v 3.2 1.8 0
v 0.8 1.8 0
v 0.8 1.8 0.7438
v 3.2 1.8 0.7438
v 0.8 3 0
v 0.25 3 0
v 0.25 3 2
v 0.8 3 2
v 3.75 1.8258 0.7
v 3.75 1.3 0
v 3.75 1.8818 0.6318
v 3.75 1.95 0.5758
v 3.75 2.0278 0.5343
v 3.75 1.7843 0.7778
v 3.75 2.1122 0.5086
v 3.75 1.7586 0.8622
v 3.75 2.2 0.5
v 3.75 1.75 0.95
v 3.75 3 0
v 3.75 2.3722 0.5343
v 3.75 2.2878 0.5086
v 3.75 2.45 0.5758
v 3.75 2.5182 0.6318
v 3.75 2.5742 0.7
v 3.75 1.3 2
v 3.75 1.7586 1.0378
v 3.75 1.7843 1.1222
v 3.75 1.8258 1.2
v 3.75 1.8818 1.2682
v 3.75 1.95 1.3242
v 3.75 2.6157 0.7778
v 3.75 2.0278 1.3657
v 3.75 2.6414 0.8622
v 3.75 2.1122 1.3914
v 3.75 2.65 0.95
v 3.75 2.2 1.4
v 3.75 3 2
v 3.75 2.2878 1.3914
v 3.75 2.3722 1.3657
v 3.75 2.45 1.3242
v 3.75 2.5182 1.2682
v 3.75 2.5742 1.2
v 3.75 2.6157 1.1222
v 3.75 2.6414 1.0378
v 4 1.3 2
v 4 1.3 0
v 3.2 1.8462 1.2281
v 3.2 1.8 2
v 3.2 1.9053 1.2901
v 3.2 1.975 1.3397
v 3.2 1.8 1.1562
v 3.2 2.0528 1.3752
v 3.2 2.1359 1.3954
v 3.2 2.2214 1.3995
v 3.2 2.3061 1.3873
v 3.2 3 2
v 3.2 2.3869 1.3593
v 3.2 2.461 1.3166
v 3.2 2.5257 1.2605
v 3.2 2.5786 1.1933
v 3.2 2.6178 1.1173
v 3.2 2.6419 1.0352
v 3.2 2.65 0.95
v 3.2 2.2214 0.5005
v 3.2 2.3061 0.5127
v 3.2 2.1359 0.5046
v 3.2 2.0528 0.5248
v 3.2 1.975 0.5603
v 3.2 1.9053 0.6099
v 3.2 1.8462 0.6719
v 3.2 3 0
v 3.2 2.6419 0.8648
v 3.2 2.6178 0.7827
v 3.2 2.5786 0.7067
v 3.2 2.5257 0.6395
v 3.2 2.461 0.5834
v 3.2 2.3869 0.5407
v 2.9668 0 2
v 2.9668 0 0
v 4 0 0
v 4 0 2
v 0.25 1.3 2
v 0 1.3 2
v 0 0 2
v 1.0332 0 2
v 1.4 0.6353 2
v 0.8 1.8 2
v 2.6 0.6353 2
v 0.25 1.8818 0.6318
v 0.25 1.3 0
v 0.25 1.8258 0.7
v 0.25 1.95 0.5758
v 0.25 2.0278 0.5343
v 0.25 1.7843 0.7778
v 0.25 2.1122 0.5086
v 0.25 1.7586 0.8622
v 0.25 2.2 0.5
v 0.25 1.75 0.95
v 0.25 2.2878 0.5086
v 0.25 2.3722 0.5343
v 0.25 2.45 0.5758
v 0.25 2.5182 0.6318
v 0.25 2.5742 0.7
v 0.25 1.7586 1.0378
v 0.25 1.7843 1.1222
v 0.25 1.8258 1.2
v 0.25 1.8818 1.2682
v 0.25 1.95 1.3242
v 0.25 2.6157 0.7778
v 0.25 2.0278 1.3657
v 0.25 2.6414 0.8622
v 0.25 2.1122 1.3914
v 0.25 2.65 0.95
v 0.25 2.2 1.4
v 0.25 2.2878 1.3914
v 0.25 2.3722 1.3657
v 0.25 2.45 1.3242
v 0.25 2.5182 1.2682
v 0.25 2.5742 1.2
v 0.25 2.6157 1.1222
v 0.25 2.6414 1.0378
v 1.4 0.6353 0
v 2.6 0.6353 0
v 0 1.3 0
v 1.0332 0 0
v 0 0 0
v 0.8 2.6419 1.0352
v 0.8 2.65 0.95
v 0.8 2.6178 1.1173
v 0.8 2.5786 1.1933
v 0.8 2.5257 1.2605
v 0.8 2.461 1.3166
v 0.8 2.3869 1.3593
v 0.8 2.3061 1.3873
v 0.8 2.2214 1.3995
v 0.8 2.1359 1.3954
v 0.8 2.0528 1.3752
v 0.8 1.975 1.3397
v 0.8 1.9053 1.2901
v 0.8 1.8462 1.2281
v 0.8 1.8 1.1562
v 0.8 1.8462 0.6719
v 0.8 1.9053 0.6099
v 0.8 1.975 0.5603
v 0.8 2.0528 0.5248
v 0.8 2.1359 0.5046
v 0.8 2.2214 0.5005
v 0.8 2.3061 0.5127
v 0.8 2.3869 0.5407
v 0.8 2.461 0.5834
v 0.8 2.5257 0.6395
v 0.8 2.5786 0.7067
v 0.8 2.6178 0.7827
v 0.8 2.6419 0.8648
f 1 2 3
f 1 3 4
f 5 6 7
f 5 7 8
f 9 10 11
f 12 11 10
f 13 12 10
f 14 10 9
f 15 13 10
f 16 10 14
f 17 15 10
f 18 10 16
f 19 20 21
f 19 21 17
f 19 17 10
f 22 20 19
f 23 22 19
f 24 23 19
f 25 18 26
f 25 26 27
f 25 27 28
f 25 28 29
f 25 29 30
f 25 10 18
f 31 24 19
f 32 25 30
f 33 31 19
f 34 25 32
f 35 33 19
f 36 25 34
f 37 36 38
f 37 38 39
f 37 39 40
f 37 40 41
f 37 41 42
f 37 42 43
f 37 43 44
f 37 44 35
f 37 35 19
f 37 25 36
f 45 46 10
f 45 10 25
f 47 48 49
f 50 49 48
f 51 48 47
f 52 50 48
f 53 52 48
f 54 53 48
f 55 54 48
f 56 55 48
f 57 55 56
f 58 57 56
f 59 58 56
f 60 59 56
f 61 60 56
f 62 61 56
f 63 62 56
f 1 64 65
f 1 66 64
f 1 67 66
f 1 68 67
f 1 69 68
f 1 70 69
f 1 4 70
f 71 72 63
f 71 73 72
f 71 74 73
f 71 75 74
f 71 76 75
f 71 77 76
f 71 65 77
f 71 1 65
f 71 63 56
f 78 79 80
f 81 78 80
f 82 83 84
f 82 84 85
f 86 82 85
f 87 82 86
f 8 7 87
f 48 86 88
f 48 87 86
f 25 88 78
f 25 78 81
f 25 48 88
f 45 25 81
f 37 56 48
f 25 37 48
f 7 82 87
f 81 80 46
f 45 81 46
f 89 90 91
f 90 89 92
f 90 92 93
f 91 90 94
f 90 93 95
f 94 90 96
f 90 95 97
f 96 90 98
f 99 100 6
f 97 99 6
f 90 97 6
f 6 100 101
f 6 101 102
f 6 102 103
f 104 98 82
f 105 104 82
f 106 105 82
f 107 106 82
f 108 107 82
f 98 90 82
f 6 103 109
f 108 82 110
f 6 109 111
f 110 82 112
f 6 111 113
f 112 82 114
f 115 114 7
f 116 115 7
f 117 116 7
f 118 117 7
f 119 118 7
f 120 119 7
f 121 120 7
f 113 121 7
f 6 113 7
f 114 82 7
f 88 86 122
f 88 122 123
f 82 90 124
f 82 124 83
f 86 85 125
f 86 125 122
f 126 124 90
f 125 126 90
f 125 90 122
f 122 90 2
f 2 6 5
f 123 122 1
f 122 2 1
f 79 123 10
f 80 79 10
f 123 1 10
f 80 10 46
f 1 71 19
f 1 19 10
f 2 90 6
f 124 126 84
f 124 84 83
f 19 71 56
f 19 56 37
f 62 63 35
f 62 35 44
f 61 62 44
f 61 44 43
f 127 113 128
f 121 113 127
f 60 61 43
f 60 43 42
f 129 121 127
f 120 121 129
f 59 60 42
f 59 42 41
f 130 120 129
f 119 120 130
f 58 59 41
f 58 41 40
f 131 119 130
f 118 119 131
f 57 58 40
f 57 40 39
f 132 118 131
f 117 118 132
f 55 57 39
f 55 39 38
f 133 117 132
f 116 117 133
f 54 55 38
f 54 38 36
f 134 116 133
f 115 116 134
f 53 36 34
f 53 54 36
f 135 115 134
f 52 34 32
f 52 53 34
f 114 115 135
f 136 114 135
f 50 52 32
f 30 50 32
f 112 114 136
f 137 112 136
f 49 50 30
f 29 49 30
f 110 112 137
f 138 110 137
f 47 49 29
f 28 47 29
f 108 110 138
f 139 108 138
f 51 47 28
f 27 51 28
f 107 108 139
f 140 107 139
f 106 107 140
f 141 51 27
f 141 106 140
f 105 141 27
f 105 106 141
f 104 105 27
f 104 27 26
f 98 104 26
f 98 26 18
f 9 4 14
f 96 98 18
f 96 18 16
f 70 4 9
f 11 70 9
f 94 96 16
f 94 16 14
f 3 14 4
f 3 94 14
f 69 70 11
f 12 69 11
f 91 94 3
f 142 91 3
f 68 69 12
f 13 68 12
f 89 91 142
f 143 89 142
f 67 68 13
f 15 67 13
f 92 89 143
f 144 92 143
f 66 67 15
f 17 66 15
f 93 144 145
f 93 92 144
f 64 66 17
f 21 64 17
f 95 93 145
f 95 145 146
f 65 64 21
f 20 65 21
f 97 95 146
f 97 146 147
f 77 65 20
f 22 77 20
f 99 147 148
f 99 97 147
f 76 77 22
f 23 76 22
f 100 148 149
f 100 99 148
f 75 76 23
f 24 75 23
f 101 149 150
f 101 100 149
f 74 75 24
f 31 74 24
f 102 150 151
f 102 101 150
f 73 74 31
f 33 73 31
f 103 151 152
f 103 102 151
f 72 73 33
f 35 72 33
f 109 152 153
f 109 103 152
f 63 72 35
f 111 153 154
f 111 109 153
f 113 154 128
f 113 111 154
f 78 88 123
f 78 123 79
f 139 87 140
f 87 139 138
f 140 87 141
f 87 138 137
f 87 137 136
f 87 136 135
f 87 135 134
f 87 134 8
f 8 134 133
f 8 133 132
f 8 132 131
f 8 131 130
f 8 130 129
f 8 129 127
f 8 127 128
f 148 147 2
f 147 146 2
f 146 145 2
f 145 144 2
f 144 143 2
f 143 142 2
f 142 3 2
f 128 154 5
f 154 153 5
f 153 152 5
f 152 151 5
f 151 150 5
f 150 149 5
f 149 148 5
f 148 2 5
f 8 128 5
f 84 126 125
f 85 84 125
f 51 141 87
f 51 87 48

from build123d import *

# Parameters (mm, degrees)
BOX_W                = 4
BOX_H                = 3
BOX_DEPTH            = 2
SKETCH_W             = 1.7
SKETCH_H             = 2
POCKET_DEPTH         = 0.25
SKETCH001_W          = 1.7
SKETCH001_H          = 2
POCKET001_DEPTH      = 0.25
PRISM_DEPTH          = 2
SKETCH003_R          = 0.45
POCKET002_DEPTH      = 5
BOX001_W             = 2.4
BOX001_H             = 1.2
BOX001_DEPTH         = 2
SKETCH004_R          = 0.45
POCKET003_DEPTH      = 0.001
POCKET003_DEPTH_BACK = -4.001


with BuildPart() as part:
    # Box → Box (join)
    with BuildSketch(Plane.XY):
        with Locations((2, 1.5)):
            Rectangle(BOX_W, BOX_H)
    extrude(amount=BOX_DEPTH)

    # Sketch → Pocket (cut, symmetric)
    with BuildSketch(Plane.YZ):
        with Locations((2.15, 1)):
            Rectangle(SKETCH_W, SKETCH_H)
    extrude(amount=POCKET_DEPTH, both=True, mode=Mode.SUBTRACT)

    # Sketch001 (on Face8 of Pocket) → Pocket001 (cut, symmetric)
    with BuildSketch(Plane.YZ.offset(4)):
        with Locations((2.15, 1)):
            Rectangle(SKETCH001_W, SKETCH001_H)
    extrude(amount=POCKET001_DEPTH, both=True, mode=Mode.SUBTRACT)

    # Prism → Prism (cut)
    with BuildSketch(Plane(origin=(2, -0.40392, 2), x_dir=(1, 0, 0), z_dir=(0, 0, -1))):
        Polygon((1.2, 0), (0.6, 1.03923), (-0.6, 1.03923), (-1.2, 0), (-0.6, -1.03923), (0.6, -1.03923), align=None)
    extrude(amount=PRISM_DEPTH, mode=Mode.SUBTRACT)

    # Sketch003 (on Face8 of Prism) → Pocket002 (cut)
    with BuildSketch(Plane(origin=(3.75, -0.40392, 2), x_dir=(0, -1, 0), z_dir=(1, 0, 0))):
        with Locations((2.15, 1)):
            Circle(SKETCH003_R)
    extrude(amount=-POCKET002_DEPTH, mode=Mode.SUBTRACT)

    # Box001 → Box001 (cut)
    with BuildSketch(Plane(origin=(0.8, 1.8, 0), x_dir=(1, 0, 0), z_dir=(0, 0, 1))):
        with Locations((1.2, 0.6)):
            Rectangle(BOX001_W, BOX001_H)
    extrude(amount=BOX001_DEPTH, mode=Mode.SUBTRACT)

    # Sketch004 → Pocket003 (cut, two sides)
    with BuildSketch(Plane.YZ) as pocket003_sk:
        with Locations((2.2, 0.95)):
            Circle(SKETCH004_R)
    extrude(amount=-POCKET003_DEPTH, mode=Mode.SUBTRACT)
    extrude(pocket003_sk.sketch, amount=-POCKET003_DEPTH_BACK, mode=Mode.SUBTRACT)


solid = part.part
